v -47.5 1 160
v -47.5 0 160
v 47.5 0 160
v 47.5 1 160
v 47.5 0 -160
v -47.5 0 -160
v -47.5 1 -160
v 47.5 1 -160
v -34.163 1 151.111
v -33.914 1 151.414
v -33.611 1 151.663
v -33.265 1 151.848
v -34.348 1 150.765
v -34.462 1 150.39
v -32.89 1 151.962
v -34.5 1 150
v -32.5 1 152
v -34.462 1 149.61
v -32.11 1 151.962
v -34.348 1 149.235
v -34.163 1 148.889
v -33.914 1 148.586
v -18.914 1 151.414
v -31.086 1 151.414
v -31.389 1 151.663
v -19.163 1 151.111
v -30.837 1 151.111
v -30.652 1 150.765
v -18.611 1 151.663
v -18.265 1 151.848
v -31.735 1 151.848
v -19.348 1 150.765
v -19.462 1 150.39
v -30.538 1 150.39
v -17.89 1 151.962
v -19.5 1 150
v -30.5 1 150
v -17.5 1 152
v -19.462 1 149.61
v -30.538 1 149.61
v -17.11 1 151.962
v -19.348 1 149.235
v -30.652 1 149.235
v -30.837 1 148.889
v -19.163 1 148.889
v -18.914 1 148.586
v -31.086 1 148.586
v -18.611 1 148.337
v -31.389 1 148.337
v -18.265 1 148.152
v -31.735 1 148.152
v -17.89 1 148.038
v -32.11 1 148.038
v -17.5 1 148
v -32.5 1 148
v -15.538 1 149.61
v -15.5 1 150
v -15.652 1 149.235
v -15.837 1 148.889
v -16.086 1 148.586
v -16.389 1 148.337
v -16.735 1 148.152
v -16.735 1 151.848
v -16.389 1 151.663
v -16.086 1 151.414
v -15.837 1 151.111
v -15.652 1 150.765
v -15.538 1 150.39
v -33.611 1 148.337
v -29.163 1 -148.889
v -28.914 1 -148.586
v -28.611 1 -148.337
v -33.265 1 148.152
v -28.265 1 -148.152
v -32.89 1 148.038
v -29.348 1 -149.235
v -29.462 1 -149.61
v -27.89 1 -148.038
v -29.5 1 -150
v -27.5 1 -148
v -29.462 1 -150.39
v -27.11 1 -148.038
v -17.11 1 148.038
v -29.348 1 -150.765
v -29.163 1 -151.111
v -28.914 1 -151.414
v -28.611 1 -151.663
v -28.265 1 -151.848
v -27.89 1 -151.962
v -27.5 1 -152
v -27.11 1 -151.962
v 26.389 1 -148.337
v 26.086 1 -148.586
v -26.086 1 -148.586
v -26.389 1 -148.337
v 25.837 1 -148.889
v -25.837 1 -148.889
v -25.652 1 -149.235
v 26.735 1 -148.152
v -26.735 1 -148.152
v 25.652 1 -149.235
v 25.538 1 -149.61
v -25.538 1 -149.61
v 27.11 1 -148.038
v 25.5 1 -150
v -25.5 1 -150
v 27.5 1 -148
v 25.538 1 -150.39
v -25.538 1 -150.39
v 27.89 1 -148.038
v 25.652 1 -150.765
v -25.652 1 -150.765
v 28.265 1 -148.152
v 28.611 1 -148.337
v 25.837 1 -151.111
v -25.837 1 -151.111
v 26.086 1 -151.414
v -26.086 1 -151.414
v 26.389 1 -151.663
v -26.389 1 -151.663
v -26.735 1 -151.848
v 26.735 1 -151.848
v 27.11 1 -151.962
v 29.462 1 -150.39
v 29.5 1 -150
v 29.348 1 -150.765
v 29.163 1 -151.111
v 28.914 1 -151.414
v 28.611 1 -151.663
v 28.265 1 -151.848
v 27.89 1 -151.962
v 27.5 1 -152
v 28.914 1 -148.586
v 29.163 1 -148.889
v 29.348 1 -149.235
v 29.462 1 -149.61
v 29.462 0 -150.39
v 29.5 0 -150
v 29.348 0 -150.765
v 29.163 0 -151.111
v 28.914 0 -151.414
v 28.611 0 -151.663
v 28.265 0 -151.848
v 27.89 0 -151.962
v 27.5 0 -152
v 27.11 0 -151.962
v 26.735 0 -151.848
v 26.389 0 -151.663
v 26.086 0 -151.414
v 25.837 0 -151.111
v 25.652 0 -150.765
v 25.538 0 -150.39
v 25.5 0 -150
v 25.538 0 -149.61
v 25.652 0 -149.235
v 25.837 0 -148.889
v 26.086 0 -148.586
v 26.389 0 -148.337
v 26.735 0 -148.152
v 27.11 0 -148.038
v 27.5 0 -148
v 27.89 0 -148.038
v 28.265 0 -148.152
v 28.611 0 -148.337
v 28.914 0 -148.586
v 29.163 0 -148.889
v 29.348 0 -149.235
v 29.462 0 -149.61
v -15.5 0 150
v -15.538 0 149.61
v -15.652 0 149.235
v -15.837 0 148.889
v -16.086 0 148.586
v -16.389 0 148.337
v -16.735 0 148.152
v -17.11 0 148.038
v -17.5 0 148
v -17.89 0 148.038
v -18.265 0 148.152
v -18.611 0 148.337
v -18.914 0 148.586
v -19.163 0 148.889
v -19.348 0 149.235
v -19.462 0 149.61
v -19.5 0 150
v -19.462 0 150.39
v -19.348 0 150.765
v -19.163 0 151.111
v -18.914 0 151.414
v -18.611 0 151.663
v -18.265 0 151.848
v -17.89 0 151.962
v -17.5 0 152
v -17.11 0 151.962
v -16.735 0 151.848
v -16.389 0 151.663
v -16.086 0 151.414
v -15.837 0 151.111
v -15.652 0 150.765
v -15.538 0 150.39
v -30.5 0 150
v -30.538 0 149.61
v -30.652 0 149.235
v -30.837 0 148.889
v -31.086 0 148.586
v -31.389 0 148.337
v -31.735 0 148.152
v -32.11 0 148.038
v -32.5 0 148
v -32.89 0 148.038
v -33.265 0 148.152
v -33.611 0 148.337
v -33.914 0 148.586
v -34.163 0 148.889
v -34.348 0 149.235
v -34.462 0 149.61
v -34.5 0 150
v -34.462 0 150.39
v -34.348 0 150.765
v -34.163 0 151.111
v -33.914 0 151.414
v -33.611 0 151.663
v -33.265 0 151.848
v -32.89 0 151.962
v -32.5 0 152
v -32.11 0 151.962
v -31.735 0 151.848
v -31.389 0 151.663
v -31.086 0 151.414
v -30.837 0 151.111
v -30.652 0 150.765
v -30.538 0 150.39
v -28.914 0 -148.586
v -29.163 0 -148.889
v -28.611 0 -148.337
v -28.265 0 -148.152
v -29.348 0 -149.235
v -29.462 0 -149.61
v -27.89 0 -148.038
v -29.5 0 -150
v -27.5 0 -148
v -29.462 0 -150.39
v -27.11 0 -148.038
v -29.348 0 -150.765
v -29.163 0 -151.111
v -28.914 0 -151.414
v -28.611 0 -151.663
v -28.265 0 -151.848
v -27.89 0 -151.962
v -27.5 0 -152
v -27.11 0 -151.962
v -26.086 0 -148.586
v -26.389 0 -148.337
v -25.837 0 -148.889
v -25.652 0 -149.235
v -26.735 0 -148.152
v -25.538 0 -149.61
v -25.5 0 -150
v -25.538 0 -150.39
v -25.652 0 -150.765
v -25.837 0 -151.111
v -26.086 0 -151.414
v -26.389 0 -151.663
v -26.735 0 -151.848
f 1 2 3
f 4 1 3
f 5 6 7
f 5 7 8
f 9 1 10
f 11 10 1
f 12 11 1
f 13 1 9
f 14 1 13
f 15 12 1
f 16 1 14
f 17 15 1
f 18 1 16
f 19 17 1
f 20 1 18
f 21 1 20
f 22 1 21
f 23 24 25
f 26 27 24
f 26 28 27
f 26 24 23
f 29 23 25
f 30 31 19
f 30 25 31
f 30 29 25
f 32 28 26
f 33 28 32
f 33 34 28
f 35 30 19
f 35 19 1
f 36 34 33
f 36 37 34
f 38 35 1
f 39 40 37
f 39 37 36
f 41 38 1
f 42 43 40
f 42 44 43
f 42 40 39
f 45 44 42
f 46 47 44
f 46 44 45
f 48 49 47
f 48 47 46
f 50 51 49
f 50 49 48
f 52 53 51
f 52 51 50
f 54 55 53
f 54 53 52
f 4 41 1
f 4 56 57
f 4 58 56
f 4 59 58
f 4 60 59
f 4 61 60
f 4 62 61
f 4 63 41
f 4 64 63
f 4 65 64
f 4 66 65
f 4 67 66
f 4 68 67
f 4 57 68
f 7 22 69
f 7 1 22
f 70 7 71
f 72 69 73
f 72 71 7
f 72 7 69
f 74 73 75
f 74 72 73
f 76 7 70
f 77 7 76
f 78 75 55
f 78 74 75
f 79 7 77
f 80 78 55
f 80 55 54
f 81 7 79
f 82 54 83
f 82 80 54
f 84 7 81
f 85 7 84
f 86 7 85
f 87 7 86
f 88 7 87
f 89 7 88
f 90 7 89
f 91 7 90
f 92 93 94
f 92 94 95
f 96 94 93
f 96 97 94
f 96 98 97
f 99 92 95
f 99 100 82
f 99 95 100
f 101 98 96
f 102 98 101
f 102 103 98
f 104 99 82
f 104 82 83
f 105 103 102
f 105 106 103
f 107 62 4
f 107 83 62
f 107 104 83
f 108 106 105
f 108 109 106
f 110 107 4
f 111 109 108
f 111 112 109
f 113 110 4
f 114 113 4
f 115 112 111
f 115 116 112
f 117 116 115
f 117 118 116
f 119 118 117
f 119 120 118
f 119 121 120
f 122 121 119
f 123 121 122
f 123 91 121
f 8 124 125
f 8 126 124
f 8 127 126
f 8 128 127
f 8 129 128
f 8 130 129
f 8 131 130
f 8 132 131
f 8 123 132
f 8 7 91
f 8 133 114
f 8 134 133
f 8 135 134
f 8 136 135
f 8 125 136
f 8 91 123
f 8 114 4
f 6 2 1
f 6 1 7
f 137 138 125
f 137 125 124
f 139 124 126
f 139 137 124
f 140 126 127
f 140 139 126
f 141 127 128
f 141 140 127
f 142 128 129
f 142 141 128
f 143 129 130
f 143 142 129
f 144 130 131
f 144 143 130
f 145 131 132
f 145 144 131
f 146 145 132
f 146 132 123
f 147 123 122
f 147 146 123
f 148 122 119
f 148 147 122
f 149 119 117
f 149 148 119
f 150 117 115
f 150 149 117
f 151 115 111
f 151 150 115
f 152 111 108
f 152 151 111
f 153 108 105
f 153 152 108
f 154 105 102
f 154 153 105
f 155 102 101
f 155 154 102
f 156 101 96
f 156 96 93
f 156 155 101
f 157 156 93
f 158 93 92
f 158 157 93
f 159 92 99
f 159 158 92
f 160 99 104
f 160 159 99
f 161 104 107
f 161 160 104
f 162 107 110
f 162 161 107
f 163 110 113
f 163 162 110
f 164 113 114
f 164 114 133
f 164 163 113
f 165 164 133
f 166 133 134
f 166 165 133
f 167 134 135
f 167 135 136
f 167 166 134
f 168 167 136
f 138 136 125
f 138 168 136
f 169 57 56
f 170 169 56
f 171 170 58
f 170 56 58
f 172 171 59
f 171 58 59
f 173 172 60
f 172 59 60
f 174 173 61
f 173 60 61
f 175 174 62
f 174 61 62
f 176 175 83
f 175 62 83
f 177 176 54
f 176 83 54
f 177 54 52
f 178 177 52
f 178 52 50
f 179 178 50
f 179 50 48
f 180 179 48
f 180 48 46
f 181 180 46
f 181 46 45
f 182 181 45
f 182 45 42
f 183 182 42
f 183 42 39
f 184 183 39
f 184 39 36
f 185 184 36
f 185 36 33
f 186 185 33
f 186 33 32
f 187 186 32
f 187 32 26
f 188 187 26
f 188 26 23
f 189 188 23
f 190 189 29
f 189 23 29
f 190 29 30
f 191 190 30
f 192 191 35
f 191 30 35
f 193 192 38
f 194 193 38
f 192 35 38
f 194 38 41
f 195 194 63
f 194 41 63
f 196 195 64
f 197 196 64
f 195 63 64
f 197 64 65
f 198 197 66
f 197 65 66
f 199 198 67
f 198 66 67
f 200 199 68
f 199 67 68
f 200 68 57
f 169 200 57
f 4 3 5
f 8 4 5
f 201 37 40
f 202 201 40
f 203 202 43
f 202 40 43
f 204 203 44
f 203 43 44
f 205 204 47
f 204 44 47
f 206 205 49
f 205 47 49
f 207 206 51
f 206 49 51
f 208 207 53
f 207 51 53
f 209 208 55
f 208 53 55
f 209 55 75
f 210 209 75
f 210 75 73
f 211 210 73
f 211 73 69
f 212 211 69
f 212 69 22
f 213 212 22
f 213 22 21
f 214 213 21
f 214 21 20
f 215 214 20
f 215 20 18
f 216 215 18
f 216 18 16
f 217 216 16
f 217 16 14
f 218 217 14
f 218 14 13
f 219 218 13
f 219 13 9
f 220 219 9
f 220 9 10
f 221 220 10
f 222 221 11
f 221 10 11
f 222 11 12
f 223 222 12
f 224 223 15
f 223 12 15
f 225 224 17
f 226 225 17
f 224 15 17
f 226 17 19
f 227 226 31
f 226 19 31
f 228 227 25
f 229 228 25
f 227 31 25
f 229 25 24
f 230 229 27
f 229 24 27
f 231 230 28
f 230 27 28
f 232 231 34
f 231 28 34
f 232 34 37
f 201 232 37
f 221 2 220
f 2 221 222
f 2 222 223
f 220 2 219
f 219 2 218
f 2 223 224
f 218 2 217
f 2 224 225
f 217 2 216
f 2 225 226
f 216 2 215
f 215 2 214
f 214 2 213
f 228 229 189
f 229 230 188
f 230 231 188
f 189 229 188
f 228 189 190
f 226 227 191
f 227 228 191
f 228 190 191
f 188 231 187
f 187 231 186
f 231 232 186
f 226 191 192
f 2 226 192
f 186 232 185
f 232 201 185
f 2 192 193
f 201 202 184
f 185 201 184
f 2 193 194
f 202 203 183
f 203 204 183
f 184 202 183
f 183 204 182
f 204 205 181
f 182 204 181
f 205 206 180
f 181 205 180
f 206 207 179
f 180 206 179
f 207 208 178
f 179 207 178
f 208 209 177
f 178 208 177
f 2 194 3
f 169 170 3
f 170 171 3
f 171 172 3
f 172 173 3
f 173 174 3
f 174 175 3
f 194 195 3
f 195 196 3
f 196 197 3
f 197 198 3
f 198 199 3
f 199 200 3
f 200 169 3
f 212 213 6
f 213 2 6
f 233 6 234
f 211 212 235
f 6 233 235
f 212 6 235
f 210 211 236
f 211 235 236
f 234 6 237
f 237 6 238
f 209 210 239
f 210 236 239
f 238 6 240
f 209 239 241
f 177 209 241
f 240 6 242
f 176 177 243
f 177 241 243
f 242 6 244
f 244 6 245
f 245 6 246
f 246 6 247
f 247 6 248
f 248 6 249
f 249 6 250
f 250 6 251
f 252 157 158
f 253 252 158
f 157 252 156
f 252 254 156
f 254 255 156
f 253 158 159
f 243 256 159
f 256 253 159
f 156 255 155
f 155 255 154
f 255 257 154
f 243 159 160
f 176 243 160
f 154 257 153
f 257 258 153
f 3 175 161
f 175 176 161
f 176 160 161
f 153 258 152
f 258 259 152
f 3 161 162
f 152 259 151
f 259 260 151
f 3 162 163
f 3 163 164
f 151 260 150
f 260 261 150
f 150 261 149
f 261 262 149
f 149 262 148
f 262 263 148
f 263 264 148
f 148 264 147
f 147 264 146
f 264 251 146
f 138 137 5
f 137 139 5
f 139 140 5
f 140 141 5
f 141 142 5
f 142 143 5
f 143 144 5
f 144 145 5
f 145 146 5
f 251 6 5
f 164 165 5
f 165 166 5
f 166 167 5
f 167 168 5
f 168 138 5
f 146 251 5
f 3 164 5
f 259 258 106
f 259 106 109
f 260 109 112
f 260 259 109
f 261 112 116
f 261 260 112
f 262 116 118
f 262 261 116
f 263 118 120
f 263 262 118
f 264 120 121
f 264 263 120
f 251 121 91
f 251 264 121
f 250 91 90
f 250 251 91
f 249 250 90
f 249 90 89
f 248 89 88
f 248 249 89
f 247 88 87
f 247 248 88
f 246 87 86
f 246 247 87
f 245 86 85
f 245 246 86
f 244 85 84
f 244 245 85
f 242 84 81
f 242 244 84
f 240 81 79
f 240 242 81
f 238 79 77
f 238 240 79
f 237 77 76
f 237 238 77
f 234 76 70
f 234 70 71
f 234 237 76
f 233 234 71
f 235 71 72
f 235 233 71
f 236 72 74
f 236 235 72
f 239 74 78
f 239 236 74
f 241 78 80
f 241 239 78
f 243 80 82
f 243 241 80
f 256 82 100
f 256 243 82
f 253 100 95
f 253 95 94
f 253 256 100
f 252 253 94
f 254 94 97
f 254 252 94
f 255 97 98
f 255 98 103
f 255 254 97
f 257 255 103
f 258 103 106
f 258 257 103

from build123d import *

# Parameters (mm, degrees)
SKETCH1_W               = 95
SKETCH1_H               = 320
SKETCH1_R               = 2
BOSS_EXTRUDE1_DEPTH     = 1
SKETCH2_R               = 2
CUT_EXTRUDE1_DEPTH      = 1
CUT_EXTRUDE1_DEPTH_BACK = 2


with BuildPart() as part:
    # Sketch1 → Boss-Extrude1 (new body)
    with BuildSketch(Plane(origin=(0, 0, 0), x_dir=(1, 0, 0), z_dir=(0, 1, 0))):
        Rectangle(SKETCH1_W, SKETCH1_H)
        with Locations((-27.5, 150)):
            Circle(SKETCH1_R, mode=Mode.SUBTRACT)
        with Locations((27.5, 150)):
            Circle(SKETCH1_R, mode=Mode.SUBTRACT)
    extrude(amount=BOSS_EXTRUDE1_DEPTH)

    # Sketch2 → Cut-Extrude1 (cut, two sides)
    with BuildSketch(Plane(origin=(0, 1, 0), x_dir=(1, 0, 0), z_dir=(0, 1, 0))) as cut_extrude1_sk:
        with Locations((-32.5, -150)):
            Circle(SKETCH2_R)
        with Locations((-17.5, -150)):
            Circle(SKETCH2_R)
    extrude(amount=CUT_EXTRUDE1_DEPTH, mode=Mode.SUBTRACT)
    extrude(cut_extrude1_sk.sketch, amount=-CUT_EXTRUDE1_DEPTH_BACK, mode=Mode.SUBTRACT)


solid = part.part
